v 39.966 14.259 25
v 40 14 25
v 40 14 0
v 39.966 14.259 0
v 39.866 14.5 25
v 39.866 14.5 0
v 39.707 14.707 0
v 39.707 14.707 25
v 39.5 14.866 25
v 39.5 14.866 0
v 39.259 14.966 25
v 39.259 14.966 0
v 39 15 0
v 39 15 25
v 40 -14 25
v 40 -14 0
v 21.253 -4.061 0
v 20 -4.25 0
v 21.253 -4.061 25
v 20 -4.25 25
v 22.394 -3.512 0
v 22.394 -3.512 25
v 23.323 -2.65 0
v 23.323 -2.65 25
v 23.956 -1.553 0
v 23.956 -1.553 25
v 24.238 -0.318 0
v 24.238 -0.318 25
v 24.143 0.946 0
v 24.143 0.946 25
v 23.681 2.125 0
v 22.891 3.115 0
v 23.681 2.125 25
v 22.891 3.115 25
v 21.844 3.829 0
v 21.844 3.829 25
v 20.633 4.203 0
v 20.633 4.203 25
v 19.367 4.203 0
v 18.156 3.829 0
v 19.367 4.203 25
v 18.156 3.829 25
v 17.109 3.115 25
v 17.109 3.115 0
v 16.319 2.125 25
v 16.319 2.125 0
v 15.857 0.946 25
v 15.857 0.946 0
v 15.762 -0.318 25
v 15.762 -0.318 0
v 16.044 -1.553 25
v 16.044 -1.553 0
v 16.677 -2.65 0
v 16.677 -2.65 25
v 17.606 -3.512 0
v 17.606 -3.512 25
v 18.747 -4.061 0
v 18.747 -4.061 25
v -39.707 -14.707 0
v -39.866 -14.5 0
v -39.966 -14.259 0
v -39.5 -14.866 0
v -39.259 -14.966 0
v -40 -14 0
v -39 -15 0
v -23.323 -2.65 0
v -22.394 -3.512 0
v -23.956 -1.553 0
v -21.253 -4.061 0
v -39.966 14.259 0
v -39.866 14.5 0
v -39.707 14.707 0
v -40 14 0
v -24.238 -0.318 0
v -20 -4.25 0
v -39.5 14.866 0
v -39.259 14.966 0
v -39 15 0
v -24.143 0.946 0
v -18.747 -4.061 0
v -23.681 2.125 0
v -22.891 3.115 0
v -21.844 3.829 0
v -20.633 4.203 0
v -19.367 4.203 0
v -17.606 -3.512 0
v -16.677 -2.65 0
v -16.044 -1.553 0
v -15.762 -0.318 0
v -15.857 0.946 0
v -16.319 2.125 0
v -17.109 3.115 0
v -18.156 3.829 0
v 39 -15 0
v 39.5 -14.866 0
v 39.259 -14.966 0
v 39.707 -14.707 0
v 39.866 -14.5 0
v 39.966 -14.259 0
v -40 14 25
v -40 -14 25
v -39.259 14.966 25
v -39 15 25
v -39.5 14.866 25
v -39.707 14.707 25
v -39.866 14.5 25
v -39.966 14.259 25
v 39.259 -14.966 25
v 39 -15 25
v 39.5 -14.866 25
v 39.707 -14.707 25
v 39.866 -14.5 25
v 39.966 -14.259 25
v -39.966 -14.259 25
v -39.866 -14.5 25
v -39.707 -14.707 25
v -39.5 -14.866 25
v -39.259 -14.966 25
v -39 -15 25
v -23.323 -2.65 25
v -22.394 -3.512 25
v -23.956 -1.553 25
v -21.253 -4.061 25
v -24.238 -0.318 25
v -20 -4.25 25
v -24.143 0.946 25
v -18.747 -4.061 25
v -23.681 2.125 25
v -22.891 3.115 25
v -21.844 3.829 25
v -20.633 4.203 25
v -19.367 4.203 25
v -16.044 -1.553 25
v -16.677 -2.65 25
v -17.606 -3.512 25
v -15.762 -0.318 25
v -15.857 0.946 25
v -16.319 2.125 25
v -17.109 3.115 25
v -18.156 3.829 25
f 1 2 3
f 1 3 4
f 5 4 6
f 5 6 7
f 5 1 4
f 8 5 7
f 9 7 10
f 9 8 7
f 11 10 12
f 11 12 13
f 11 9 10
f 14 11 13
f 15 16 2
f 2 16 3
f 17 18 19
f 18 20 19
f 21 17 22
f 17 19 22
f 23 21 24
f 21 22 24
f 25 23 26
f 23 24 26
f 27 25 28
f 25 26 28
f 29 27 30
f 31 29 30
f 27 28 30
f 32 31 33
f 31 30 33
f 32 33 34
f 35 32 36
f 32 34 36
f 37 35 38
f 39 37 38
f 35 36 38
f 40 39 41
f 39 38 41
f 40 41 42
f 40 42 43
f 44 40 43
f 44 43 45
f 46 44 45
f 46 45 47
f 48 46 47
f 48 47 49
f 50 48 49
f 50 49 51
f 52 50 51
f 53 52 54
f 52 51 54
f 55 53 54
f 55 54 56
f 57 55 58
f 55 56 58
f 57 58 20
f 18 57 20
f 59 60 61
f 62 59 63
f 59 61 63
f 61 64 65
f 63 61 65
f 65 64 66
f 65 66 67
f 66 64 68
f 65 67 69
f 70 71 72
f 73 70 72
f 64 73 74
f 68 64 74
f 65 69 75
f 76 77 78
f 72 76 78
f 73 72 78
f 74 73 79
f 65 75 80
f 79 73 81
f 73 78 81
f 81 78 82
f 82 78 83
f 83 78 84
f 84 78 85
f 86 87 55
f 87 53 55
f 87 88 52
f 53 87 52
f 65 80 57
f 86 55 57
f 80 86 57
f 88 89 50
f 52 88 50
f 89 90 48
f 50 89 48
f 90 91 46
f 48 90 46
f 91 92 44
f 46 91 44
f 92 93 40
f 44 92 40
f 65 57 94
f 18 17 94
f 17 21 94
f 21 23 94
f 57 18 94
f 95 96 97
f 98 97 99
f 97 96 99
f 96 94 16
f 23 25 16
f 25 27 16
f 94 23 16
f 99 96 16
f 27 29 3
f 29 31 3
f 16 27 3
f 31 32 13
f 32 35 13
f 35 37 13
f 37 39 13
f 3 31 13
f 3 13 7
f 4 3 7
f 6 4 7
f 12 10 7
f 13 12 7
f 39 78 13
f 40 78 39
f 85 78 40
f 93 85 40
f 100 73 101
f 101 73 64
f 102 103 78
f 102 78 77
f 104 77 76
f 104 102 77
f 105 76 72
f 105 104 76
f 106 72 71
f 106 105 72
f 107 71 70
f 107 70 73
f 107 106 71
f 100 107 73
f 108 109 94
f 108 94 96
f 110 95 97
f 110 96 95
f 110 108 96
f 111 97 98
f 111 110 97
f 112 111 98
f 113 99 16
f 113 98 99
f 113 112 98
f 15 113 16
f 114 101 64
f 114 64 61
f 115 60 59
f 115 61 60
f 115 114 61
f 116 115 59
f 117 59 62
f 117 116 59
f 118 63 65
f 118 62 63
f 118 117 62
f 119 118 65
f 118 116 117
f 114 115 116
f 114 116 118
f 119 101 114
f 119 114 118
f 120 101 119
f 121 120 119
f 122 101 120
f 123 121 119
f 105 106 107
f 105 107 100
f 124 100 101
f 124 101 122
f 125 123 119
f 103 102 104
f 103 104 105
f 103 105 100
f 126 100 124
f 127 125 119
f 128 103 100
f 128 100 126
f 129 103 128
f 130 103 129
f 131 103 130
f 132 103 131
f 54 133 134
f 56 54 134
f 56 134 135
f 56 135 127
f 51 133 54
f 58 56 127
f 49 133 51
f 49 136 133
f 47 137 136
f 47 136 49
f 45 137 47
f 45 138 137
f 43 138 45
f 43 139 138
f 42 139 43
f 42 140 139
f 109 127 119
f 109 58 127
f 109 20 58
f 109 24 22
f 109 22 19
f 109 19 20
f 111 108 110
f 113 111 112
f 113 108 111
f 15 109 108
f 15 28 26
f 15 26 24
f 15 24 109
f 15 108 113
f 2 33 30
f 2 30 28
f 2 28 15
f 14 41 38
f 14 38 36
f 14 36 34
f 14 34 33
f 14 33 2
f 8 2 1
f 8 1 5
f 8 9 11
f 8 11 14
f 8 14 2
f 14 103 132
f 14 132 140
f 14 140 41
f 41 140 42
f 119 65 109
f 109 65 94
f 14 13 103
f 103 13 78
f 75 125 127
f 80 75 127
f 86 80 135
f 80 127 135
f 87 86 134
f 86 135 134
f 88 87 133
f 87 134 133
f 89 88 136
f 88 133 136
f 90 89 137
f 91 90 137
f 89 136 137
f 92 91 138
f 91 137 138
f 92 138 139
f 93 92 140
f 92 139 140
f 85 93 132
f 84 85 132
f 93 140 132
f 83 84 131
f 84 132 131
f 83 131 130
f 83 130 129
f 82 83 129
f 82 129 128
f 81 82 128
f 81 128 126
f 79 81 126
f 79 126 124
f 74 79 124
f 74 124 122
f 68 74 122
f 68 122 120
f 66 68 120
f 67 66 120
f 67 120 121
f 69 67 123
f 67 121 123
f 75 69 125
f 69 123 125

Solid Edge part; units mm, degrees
sketch "Sketch1" plane through (0, 0, 0) normal (0, 0, 1) x (1, 0, 0)
  line L0 (40, -15) -> (40, 15)
  line L1 (40, 15) -> (-40, 15)
  line L2 (-40, 15) -> (-40, -15)
  line L3 (-40, -15) -> (40, -15)
extrude "Protrusion1" add sketch "Sketch1" along normal blind 25
hole "Bohrung_1" at (-20, 0, 25) direction (0, 0, -1) diameter 8.5 end through all
hole "Hole1" at (20, 0, 25) direction (0, 0, -1) diameter 8.5 end through all
fillet "Verrundung_1" radius 1 4 edges at (-40, 15, 12.5) (-40, -15, 12.5) (40, -15, 12.5) (40, 15, 12.5)
